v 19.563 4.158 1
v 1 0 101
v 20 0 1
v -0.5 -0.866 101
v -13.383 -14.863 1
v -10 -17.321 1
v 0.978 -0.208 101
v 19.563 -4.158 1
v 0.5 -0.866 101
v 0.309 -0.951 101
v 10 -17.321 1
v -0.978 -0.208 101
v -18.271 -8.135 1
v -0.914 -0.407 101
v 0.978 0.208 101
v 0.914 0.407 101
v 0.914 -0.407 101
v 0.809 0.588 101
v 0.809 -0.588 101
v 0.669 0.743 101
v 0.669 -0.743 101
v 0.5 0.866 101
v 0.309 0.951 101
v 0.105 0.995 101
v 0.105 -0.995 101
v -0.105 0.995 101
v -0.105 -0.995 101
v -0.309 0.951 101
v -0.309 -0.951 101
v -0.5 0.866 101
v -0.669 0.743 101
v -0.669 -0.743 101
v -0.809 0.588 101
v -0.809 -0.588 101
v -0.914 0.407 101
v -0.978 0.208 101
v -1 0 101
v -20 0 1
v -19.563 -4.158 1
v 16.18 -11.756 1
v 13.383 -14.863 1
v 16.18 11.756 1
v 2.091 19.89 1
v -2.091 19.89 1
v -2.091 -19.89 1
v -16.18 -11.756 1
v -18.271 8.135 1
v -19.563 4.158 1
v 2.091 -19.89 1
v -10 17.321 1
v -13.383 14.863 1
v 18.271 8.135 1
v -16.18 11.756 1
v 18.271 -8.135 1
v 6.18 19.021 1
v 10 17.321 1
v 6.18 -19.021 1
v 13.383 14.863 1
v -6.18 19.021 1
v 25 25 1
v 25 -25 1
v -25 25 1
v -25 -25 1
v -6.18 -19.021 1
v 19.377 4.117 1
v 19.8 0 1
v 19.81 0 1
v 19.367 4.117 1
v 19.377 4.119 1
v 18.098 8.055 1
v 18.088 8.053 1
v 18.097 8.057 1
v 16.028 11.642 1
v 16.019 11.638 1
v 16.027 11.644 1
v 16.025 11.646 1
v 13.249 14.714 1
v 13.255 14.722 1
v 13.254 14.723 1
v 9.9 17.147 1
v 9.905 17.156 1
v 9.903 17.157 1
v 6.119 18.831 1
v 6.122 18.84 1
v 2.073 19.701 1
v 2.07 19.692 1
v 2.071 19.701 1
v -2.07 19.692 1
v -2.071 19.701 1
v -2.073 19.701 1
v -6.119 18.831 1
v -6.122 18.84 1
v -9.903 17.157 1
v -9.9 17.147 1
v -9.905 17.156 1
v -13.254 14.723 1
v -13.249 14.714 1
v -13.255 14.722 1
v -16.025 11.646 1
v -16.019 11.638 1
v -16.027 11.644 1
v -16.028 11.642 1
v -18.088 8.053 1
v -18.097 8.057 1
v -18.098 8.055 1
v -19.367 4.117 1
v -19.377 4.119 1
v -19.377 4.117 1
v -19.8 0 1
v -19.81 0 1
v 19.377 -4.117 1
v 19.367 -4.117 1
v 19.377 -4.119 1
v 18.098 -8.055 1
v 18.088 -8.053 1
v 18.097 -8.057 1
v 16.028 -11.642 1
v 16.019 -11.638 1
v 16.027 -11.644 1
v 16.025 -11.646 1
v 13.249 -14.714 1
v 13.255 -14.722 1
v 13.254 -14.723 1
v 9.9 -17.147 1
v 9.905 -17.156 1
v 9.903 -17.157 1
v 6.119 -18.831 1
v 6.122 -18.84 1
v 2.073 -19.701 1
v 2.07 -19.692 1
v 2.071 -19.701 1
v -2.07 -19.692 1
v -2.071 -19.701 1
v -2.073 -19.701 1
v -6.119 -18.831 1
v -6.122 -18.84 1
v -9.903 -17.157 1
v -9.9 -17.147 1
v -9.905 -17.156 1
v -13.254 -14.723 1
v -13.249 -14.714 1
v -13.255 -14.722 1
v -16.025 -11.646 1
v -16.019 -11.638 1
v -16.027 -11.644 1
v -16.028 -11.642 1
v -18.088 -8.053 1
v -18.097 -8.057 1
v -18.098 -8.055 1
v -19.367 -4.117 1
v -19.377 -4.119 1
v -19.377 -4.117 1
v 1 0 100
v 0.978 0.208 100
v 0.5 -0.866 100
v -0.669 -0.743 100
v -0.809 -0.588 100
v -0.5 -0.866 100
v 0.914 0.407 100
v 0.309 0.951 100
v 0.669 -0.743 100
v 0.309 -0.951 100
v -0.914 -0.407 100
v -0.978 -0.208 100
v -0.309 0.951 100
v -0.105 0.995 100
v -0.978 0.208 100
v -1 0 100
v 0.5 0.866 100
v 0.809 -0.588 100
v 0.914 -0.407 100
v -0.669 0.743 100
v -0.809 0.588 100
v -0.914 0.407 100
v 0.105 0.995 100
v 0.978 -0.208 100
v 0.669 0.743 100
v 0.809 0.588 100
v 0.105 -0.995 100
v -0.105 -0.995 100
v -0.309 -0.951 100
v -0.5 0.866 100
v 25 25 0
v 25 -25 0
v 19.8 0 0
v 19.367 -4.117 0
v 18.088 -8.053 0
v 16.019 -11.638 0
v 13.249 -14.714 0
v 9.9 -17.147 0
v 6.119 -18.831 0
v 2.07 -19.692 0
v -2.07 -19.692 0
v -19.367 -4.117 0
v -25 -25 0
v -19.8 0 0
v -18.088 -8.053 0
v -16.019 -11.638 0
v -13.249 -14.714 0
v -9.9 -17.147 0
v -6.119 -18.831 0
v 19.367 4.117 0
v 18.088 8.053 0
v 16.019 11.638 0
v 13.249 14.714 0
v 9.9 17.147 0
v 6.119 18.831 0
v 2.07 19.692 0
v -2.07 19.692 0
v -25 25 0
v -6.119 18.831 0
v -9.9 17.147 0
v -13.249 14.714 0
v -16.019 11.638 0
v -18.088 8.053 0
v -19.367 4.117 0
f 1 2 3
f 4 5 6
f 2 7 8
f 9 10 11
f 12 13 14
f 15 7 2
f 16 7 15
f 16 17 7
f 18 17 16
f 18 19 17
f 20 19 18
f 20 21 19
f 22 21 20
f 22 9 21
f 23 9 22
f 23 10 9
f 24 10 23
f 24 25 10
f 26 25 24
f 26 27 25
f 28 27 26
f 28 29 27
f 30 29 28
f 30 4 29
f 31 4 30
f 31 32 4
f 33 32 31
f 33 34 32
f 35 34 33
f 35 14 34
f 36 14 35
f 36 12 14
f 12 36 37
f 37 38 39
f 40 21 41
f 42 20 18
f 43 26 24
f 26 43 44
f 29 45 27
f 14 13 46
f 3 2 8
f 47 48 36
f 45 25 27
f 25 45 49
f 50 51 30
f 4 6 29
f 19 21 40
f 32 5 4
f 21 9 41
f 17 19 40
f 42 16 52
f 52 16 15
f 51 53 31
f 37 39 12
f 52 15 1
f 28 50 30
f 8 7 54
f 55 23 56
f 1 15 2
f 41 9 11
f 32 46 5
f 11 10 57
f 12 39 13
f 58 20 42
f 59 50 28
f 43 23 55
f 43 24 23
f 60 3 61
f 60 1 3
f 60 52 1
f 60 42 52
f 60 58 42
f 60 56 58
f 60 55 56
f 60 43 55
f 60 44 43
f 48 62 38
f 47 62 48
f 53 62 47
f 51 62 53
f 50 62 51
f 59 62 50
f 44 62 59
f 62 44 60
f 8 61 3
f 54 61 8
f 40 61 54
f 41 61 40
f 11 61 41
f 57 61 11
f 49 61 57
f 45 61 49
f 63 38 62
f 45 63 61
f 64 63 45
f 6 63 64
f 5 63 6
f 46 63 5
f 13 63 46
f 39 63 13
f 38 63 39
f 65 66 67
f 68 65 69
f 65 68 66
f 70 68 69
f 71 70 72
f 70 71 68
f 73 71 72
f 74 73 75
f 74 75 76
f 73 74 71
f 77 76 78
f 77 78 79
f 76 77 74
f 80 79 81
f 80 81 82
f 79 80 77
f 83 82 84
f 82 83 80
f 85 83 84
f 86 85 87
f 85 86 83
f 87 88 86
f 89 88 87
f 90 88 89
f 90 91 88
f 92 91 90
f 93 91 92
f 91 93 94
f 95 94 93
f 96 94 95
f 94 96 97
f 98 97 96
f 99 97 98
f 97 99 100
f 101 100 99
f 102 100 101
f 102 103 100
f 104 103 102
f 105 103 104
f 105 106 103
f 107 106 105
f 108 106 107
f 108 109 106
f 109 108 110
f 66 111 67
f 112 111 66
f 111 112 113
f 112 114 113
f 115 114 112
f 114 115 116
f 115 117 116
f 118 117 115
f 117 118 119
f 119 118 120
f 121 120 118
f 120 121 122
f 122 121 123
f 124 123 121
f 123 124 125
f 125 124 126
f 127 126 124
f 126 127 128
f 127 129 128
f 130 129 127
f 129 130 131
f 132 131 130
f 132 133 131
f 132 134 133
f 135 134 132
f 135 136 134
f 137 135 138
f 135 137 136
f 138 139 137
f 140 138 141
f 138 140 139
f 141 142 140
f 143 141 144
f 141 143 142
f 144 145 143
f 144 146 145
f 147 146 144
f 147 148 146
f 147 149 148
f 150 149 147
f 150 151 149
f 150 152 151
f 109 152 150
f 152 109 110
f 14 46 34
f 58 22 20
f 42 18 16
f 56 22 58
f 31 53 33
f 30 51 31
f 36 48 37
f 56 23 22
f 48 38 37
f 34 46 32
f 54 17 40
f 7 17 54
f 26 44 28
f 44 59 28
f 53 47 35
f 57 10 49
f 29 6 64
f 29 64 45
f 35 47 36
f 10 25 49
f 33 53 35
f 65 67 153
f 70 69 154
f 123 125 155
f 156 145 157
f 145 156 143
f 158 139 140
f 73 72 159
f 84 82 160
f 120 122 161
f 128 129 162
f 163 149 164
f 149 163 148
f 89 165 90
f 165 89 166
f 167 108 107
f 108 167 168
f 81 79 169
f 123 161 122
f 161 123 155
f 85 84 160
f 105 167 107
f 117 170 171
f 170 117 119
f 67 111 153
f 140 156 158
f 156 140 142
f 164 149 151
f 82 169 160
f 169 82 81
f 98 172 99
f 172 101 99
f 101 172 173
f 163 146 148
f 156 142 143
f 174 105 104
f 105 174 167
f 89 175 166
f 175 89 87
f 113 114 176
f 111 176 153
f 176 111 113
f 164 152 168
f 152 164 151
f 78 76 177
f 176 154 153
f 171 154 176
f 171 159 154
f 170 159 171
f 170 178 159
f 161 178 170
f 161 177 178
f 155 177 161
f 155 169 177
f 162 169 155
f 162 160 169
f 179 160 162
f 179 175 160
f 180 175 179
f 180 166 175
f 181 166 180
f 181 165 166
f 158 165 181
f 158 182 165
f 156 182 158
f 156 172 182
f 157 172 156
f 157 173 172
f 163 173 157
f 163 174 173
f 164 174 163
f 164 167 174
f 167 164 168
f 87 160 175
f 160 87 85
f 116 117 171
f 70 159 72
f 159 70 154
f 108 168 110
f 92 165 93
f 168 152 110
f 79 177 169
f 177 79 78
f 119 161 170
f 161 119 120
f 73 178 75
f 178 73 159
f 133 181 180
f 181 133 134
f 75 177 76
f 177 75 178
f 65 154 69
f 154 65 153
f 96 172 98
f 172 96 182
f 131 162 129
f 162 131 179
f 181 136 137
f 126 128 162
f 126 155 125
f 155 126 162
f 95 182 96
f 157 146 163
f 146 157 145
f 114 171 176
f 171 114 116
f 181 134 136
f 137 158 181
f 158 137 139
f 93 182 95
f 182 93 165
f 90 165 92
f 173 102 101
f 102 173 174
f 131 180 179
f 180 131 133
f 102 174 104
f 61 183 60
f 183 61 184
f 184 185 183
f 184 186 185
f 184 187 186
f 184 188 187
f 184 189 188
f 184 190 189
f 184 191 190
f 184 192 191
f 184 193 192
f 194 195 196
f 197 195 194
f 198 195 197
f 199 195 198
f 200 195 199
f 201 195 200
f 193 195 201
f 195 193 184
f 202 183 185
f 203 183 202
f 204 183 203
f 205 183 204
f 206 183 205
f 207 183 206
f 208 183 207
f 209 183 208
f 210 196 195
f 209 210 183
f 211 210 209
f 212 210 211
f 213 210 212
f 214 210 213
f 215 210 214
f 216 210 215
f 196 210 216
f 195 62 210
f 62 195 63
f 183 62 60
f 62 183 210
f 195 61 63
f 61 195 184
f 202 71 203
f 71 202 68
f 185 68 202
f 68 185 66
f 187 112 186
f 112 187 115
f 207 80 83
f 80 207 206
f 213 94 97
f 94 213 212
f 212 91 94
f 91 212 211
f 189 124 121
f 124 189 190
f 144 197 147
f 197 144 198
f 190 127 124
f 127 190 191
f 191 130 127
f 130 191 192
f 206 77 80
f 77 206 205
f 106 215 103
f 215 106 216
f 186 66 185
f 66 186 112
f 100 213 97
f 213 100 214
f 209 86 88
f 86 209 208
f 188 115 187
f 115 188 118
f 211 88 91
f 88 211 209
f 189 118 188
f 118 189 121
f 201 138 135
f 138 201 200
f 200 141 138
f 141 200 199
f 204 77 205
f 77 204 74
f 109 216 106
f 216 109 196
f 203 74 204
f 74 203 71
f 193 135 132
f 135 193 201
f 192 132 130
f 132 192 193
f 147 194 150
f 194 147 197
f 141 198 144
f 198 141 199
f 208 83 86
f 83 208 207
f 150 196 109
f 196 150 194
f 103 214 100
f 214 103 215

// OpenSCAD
//Kaho Abe for Costumes as Game Controllers
//http://kahoabe.net
//To make hollow spikes for costumes, and to put LEDs/Neopixels inside. 

//These are the values you can change
coneH = 100; //cone height
coneR = 20; //cone radius
baseH = 1; //height of base
baseS = 50; //size of base along x,y
diff = 1; //difference between outside and inside along z
       
       
difference(){ //draws spike and hollows out spike

        translate([0,0,coneH/2+baseH]) cylinder(h = coneH, r1 = coneR, r2 = 1, center = true); 
       
        translate([0,0,coneH/2+baseH-diff]) cylinder(h = coneH, r1 = coneR, r2 = 1, center = true); 
 
}
difference(){ //draws base and opens base to inside of spike

translate([0,0,baseH/2]) cube(size = [coneR+30,coneR+30,baseH], center = true);
     translate([0,0,0]) cylinder(h = 4.001, r1 = (coneH-baseH) * (coneR/coneH), r2 = (coneH-baseH) * (coneR/coneH), center = true);  
}
 echo(version=version());
